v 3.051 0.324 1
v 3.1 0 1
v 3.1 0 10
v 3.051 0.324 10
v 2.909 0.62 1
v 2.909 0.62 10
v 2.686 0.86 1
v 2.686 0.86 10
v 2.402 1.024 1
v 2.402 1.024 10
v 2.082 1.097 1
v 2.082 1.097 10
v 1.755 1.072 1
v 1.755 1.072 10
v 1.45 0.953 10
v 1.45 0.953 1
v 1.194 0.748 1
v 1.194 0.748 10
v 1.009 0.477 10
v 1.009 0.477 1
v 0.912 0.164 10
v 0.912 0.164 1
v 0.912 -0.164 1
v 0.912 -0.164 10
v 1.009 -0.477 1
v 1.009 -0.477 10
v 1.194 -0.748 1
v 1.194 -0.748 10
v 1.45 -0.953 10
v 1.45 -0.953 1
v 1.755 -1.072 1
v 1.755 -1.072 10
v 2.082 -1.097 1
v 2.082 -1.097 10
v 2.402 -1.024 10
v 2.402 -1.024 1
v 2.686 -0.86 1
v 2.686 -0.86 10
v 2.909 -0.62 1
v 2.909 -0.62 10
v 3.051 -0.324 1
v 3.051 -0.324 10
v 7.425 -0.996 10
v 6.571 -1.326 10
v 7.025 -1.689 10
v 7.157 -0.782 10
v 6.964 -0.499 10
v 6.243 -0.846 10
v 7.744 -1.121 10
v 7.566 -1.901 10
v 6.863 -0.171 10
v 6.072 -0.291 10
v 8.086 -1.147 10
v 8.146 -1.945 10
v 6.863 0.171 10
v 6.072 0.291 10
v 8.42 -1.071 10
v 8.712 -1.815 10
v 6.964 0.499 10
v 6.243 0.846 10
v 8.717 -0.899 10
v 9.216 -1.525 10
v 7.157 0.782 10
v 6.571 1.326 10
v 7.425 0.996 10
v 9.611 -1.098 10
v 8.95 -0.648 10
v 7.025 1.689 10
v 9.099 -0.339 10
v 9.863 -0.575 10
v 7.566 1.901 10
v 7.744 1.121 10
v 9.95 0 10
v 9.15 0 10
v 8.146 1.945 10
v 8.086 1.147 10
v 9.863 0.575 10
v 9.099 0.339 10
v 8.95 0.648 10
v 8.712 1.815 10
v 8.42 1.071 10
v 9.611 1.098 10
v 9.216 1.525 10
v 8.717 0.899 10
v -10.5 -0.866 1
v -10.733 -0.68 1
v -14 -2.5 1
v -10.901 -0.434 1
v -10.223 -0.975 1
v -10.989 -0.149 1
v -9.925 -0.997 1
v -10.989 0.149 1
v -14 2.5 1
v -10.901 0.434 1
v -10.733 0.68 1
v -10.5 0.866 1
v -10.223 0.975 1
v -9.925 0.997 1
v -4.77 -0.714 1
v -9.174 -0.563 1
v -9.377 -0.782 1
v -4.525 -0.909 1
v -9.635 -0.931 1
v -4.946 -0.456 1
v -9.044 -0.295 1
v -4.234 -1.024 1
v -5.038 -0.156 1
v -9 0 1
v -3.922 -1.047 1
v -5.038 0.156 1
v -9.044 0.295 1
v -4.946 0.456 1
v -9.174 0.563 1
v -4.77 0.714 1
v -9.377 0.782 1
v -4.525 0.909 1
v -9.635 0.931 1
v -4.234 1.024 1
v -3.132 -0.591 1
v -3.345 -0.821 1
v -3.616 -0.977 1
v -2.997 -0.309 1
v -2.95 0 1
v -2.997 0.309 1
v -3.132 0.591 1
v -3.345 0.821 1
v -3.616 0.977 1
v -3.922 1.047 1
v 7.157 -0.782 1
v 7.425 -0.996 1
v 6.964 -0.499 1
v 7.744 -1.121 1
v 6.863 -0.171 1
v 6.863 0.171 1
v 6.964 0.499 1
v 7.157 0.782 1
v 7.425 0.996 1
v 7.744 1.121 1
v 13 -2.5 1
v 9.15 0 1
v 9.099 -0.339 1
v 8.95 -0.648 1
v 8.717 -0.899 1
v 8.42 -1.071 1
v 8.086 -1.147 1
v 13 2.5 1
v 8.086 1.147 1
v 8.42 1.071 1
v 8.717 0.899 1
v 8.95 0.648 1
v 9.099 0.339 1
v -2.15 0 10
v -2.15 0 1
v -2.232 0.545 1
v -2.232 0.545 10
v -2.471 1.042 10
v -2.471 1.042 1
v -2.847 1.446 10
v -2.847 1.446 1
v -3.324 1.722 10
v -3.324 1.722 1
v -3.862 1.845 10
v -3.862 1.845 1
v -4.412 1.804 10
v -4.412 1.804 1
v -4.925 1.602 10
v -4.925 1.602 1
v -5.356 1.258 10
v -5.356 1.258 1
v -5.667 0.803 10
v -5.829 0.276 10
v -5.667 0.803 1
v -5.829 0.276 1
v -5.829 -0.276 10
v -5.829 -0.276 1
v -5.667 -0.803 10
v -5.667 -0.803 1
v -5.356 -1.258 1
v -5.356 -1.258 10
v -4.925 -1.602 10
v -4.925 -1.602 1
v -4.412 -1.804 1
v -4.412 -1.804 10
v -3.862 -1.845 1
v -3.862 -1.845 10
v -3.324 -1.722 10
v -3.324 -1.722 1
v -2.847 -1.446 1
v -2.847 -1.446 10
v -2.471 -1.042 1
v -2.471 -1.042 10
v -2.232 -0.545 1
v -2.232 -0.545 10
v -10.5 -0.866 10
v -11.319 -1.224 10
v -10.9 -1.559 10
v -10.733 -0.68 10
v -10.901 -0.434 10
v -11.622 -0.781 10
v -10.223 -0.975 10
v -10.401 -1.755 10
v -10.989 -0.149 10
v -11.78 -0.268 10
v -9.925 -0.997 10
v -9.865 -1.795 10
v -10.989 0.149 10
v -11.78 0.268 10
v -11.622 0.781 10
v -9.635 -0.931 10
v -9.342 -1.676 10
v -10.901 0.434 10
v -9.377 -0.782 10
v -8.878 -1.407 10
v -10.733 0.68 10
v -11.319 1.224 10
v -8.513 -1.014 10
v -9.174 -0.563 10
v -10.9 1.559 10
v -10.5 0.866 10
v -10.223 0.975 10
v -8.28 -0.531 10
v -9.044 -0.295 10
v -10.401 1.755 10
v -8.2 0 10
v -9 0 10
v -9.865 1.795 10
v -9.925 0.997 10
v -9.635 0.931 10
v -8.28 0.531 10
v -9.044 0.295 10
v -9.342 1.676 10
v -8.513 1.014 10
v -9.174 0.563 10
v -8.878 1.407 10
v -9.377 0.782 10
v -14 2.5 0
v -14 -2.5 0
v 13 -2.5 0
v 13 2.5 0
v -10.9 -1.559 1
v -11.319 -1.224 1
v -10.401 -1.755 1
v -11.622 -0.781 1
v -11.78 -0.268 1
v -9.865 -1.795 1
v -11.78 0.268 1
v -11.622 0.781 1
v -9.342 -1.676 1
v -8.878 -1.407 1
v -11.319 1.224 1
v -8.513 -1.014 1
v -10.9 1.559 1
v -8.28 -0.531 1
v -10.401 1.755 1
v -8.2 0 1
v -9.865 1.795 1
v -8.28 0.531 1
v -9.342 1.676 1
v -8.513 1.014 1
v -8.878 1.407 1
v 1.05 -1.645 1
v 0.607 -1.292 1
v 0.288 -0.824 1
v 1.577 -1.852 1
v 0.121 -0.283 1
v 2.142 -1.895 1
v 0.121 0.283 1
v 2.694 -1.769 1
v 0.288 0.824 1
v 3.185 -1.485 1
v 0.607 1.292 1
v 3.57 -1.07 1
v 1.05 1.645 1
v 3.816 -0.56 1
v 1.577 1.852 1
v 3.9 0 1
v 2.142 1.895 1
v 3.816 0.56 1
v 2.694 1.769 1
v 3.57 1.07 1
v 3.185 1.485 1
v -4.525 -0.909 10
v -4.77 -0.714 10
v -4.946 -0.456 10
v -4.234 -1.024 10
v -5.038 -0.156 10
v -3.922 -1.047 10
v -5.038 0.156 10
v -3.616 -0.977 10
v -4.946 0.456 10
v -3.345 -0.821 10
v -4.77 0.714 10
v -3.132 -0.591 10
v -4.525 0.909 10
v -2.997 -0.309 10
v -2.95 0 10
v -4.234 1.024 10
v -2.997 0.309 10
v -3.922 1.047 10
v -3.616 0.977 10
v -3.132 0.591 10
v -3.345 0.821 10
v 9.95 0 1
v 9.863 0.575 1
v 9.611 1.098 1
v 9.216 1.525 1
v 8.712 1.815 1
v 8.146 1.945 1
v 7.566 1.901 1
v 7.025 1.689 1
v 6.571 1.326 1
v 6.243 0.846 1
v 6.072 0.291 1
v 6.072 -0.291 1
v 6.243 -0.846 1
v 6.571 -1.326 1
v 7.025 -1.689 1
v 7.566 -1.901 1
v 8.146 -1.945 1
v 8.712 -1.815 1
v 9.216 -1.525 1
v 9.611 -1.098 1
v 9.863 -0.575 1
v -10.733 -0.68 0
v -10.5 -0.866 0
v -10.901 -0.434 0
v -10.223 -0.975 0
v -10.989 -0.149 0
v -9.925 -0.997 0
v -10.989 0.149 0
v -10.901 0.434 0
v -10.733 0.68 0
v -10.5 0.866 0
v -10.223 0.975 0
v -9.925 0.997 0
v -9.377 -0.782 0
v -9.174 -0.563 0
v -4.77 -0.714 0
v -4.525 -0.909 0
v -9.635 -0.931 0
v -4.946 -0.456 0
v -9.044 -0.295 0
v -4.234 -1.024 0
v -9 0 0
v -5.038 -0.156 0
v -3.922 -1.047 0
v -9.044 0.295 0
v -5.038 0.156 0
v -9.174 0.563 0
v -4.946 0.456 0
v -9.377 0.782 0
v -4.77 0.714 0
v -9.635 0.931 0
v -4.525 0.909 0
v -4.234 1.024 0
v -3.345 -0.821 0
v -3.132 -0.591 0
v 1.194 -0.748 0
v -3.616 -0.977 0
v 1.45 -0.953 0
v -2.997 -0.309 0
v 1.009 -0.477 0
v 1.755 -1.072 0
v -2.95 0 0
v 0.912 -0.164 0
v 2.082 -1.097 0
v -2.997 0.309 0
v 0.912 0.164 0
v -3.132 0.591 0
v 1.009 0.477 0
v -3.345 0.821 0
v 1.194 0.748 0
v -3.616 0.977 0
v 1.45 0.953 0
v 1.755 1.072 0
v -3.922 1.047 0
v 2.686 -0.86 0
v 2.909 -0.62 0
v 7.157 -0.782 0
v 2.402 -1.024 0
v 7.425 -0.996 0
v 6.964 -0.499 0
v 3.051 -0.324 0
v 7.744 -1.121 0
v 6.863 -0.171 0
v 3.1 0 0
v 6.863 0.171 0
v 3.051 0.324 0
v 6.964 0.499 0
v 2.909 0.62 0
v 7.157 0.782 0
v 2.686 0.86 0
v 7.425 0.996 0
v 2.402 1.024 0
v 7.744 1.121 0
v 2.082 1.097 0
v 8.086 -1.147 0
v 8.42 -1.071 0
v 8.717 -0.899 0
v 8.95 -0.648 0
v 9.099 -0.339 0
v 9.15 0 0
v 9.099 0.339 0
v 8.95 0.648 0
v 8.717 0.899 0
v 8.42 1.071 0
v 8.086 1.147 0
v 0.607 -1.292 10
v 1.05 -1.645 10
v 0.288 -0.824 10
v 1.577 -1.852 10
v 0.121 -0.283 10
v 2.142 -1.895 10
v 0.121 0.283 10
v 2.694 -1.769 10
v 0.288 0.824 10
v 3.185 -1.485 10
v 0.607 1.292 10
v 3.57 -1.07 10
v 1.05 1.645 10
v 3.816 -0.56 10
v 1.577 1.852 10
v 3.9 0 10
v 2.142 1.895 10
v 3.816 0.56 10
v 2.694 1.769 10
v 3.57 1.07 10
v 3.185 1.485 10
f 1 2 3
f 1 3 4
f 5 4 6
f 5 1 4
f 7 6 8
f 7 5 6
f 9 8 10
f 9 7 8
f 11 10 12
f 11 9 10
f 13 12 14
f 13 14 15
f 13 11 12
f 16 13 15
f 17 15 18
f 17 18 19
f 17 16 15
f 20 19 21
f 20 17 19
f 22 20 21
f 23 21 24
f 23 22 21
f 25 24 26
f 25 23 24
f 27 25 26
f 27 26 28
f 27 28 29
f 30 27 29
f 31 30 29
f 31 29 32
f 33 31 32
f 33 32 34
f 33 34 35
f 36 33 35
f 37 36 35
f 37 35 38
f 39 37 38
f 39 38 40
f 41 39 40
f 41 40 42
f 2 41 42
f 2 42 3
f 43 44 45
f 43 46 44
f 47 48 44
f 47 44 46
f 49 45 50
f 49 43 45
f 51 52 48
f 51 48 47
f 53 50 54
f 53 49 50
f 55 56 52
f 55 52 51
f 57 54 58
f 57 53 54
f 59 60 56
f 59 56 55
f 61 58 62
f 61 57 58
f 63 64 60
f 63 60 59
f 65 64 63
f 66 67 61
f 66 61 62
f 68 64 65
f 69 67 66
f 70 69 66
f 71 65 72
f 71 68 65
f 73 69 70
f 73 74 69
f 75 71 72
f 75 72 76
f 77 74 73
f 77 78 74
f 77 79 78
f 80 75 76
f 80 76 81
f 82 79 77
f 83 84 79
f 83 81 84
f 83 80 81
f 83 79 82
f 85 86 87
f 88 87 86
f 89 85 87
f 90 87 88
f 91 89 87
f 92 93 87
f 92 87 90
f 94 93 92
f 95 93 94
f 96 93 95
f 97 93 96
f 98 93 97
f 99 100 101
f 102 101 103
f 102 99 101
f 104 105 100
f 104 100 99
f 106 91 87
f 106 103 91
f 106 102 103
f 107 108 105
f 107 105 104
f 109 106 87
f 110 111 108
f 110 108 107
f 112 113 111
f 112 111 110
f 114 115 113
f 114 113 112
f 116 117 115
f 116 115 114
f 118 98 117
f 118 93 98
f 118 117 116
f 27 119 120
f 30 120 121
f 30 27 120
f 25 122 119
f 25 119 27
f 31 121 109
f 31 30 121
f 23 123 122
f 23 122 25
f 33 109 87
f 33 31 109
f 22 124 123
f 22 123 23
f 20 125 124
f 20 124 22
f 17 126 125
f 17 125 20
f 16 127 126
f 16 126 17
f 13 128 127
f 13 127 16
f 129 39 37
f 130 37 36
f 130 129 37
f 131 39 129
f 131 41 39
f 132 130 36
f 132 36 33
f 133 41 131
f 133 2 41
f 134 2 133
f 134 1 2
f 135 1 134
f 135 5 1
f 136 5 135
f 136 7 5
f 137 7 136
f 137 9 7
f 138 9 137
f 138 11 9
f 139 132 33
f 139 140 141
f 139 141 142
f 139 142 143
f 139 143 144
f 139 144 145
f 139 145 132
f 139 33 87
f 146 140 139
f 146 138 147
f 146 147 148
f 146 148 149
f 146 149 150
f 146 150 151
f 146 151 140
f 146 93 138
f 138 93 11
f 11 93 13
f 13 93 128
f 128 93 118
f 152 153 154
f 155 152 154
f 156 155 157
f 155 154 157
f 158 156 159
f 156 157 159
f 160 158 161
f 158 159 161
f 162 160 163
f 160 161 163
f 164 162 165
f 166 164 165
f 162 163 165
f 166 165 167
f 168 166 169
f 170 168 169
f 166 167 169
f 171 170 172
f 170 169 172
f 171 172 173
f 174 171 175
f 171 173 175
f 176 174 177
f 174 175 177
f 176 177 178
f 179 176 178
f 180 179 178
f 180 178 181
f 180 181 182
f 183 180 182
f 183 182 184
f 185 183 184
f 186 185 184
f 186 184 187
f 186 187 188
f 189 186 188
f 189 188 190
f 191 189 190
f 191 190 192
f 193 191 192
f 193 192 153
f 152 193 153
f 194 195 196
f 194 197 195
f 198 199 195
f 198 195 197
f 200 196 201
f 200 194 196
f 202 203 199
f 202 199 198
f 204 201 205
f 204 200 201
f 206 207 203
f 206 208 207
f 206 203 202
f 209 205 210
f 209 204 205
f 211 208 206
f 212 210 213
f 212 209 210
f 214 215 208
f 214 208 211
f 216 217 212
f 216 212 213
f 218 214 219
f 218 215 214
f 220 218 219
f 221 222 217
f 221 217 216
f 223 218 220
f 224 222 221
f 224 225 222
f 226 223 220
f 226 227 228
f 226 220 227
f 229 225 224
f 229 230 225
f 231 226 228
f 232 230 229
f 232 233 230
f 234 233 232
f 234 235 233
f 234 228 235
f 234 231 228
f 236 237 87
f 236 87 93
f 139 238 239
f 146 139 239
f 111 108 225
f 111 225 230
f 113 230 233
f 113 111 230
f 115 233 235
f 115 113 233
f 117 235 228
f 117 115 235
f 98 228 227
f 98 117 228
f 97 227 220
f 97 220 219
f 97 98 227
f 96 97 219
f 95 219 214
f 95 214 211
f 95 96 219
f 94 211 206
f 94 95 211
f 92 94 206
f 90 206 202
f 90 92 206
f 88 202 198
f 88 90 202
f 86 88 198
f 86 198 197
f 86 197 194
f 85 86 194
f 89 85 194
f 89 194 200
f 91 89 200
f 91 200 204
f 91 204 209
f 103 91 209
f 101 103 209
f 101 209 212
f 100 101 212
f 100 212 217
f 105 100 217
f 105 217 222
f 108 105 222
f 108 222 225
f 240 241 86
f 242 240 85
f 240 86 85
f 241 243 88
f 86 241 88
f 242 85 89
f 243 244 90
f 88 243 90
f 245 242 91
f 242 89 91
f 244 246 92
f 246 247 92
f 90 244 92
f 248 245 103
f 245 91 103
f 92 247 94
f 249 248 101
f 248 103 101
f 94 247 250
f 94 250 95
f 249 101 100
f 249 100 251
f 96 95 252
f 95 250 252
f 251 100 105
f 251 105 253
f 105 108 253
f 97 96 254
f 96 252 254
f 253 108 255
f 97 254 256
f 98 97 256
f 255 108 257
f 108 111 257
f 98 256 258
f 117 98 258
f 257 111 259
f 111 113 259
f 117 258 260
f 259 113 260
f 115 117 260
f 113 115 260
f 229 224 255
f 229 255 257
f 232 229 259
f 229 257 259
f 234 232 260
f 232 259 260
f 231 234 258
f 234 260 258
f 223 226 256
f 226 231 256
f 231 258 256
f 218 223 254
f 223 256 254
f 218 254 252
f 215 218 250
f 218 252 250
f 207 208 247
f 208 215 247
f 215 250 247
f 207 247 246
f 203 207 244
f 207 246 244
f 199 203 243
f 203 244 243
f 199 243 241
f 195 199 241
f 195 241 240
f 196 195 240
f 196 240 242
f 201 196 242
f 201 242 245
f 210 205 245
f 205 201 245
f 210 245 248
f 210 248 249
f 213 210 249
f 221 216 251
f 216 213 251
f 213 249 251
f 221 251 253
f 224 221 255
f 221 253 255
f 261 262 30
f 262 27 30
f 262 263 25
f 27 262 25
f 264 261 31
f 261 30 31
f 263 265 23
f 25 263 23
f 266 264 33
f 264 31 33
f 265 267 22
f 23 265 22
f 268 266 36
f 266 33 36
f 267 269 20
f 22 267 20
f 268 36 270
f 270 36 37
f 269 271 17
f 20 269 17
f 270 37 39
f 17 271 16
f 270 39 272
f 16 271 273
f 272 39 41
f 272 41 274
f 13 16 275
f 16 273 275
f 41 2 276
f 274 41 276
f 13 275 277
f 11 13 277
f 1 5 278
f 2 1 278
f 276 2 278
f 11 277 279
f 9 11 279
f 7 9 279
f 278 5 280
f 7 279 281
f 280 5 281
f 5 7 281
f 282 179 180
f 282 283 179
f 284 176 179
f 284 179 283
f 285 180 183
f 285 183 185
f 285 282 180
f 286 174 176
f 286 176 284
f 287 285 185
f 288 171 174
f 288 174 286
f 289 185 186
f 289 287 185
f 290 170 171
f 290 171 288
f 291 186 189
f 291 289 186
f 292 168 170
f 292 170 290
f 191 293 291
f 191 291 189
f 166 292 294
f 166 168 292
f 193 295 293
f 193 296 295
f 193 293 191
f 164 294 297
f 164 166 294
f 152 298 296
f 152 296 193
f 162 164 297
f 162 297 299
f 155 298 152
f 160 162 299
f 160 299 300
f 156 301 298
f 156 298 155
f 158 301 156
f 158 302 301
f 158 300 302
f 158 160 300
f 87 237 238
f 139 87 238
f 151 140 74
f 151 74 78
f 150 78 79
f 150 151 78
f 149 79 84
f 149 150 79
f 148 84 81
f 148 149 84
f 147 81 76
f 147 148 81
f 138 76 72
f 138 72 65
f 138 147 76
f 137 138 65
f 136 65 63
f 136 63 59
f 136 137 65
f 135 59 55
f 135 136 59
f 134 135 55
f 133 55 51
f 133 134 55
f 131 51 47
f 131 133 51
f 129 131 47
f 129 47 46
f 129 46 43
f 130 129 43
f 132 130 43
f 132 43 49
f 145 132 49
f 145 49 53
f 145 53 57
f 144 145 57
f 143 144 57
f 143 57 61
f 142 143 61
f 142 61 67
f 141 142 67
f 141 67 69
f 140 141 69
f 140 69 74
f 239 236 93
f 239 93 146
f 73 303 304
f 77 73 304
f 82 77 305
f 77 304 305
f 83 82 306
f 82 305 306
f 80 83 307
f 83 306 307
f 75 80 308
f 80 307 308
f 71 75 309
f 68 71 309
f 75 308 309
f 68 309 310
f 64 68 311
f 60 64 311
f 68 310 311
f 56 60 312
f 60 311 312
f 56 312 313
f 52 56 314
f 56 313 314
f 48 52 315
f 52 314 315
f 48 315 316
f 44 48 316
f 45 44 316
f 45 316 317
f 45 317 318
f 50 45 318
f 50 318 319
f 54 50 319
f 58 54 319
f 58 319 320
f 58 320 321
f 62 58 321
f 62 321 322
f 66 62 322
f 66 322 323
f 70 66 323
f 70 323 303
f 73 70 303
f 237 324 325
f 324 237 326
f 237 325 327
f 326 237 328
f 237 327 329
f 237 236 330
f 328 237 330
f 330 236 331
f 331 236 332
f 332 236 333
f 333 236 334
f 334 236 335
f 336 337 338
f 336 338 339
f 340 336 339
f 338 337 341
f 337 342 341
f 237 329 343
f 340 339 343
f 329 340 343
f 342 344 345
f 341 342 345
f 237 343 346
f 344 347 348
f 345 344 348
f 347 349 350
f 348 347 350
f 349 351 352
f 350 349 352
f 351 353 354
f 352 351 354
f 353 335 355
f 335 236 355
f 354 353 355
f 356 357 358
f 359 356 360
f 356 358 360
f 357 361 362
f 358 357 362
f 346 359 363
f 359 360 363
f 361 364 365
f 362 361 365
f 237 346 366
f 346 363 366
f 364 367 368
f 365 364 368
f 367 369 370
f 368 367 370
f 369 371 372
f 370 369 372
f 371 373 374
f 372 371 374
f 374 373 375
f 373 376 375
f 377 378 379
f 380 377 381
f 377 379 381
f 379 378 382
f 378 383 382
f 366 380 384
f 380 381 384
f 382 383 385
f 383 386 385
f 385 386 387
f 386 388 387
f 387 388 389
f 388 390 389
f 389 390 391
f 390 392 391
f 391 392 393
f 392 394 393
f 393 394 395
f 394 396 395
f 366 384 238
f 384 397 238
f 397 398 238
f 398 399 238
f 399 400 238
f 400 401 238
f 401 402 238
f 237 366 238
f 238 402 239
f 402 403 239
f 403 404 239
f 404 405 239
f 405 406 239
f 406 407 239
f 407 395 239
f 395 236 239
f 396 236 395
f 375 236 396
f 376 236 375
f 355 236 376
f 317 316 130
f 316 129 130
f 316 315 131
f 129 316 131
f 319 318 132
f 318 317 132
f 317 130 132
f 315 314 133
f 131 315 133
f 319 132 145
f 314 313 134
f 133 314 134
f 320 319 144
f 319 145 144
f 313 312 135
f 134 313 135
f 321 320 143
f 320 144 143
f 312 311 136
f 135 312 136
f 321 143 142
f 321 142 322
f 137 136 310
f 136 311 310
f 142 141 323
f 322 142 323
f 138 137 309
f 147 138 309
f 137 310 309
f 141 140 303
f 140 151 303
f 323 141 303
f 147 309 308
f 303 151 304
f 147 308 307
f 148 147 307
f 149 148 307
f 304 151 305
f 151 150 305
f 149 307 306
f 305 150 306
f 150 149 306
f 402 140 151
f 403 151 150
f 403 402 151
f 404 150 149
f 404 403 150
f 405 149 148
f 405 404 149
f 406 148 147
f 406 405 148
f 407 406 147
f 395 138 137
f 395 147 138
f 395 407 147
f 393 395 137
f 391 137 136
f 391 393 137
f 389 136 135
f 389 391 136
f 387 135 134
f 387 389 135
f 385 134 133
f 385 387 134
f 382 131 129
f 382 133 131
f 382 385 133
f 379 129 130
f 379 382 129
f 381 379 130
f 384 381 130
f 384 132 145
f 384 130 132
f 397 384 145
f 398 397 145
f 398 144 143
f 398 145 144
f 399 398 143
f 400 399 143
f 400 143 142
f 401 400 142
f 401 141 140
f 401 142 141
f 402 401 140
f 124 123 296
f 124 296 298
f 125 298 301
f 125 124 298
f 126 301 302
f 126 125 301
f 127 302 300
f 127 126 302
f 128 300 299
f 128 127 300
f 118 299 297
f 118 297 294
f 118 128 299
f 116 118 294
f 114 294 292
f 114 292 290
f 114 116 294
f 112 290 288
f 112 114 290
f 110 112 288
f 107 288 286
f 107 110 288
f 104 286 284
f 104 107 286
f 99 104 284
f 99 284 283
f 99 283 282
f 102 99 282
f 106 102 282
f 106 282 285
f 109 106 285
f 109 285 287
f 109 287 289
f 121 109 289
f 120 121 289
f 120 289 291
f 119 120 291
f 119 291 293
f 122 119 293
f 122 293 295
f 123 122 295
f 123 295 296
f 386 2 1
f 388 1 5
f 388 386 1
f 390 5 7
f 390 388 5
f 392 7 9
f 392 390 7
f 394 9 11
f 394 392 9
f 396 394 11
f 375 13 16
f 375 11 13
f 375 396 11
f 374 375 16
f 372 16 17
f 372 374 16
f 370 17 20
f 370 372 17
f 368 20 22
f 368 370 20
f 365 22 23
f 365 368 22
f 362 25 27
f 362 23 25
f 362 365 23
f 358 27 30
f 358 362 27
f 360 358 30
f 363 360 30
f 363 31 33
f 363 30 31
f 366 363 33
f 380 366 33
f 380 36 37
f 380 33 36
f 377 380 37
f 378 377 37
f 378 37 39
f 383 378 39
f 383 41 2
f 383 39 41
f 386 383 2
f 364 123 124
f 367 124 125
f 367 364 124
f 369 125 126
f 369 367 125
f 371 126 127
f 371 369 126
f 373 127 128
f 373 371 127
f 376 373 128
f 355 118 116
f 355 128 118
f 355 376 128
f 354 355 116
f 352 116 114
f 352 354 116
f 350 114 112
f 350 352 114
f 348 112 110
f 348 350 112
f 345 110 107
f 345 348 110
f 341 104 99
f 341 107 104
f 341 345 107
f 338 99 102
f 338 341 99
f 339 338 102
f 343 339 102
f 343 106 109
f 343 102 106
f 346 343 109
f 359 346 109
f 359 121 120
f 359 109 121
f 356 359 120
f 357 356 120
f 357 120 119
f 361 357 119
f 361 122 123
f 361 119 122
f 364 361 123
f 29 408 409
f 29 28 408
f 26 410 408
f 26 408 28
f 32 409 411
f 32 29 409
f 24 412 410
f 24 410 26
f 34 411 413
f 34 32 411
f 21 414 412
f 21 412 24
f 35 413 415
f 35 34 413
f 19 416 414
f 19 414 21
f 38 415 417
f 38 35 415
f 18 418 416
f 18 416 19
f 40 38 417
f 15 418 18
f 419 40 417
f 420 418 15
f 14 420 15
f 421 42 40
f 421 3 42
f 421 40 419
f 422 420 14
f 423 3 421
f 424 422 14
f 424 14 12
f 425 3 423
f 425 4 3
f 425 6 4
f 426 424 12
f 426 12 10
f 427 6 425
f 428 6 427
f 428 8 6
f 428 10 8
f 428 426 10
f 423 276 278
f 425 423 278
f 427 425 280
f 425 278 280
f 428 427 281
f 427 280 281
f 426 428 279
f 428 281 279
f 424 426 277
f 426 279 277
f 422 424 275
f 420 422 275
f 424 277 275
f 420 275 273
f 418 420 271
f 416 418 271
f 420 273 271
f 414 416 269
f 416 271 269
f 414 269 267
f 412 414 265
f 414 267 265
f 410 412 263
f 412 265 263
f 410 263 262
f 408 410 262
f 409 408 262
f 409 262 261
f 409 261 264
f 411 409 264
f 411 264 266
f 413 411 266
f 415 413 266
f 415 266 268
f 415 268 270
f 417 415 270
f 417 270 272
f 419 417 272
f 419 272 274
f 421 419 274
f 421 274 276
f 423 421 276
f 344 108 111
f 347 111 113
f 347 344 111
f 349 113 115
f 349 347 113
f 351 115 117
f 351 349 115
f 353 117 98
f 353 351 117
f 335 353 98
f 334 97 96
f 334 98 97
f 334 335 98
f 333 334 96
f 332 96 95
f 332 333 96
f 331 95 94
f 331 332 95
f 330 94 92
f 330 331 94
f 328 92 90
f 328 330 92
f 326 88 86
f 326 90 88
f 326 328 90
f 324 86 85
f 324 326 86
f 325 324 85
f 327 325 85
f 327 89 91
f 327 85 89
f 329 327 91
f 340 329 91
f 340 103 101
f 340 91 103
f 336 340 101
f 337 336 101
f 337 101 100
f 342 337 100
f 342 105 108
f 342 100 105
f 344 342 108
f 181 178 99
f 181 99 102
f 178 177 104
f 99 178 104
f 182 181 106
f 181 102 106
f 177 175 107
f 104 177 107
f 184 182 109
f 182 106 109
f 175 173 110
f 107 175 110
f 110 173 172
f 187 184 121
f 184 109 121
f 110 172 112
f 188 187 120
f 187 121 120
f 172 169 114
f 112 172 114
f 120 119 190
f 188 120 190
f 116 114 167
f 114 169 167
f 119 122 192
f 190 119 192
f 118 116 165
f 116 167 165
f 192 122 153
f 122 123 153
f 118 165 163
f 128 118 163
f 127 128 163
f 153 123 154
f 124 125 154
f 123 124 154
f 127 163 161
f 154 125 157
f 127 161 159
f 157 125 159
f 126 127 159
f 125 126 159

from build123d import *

# Parameters (mm, degrees)
BOX_W          = 30
BOX_H          = 5
BOX_DEPTH      = 2
CIRCLE_R       = 1
PAD_DEPTH      = 10
THICKNESS_T    = 0.8
BOX001_W       = 30
BOX001_H       = 5
BOX001_DEPTH   = 2
CIRCLE001_R    = 1.05
PAD001_DEPTH   = 10
THICKNESS001_T = 0.8
BOX002_W       = 30
BOX002_H       = 5
BOX002_DEPTH   = 2
CIRCLE002_R    = 1.1
PAD002_DEPTH   = 10
THICKNESS002_T = 0.8
BOX003_W       = 30
BOX003_H       = 5
BOX003_DEPTH   = 2
CIRCLE003_R    = 1.15
PAD003_DEPTH   = 10
THICKNESS003_T = 0.8
CIRCLE007_R    = 1.1
PAD007_DEPTH   = 10
CIRCLE006_R    = 1.15
PAD006_DEPTH   = 10
CIRCLE005_R    = 1.05
PAD005_DEPTH   = 10
CIRCLE004_R    = 1
PAD004_DEPTH   = 10
BOX004_W       = 27
BOX004_H       = 5
BOX004_DEPTH   = 1


with BuildPart() as cube:
    # Box → Box (new body)
    with BuildSketch(Plane(origin=(-15, -3, -1), x_dir=(1, 0, 0), z_dir=(0, 0, 1))):
        with Locations((15, 2.5)):
            Rectangle(BOX_W, BOX_H)
    extrude(amount=BOX_DEPTH)


with BuildPart() as cut:
    # Circle → Pad (new body)
    with BuildSketch(Plane(origin=(-10, 0, 0), x_dir=(1, 0, 0), z_dir=(0, 0, 1))):
        Circle(CIRCLE_R)
    extrude(amount=PAD_DEPTH)

    # Thickness
    thickness_openings = [cut.faces().sort_by_distance(p)[0] for p in [
        (-10, 0, 10),
    ]]
    offset(amount=THICKNESS_T, openings=thickness_openings, kind=Kind.INTERSECTION)

    # Cut: cut Cube
    add(cube.part, mode=Mode.SUBTRACT)


with BuildPart() as cube001:
    # Box001 → Box001 (new body)
    with BuildSketch(Plane(origin=(-15, -3, -1), x_dir=(1, 0, 0), z_dir=(0, 0, 1))):
        with Locations((15, 2.5)):
            Rectangle(BOX001_W, BOX001_H)
    extrude(amount=BOX001_DEPTH)


with BuildPart() as cut001:
    # Circle001 → Pad001 (new body)
    with BuildSketch(Plane(origin=(-4, 0, 0), x_dir=(1, 0, 0), z_dir=(0, 0, 1))):
        Circle(CIRCLE001_R)
    extrude(amount=PAD001_DEPTH)

    # Thickness001
    thickness001_openings = [cut001.faces().sort_by_distance(p)[0] for p in [
        (-4, 0, 10),
    ]]
    offset(amount=THICKNESS001_T, openings=thickness001_openings)

    # Cut001: cut Cube001
    add(cube001.part, mode=Mode.SUBTRACT)


with BuildPart() as cube002:
    # Box002 → Box002 (new body)
    with BuildSketch(Plane(origin=(-15, -3, -1), x_dir=(1, 0, 0), z_dir=(0, 0, 1))):
        with Locations((15, 2.5)):
            Rectangle(BOX002_W, BOX002_H)
    extrude(amount=BOX002_DEPTH)


with BuildPart() as cut002:
    # Circle002 → Pad002 (new body)
    with BuildSketch(Plane(origin=(2, 0, 0), x_dir=(1, 0, 0), z_dir=(0, 0, 1))):
        Circle(CIRCLE002_R)
    extrude(amount=PAD002_DEPTH)

    # Thickness002
    thickness002_openings = [cut002.faces().sort_by_distance(p)[0] for p in [
        (2, 0, 10),
    ]]
    offset(amount=THICKNESS002_T, openings=thickness002_openings)

    # Cut002: cut Cube002
    add(cube002.part, mode=Mode.SUBTRACT)


with BuildPart() as cube003:
    # Box003 → Box003 (new body)
    with BuildSketch(Plane(origin=(-15, -3, -1), x_dir=(1, 0, 0), z_dir=(0, 0, 1))):
        with Locations((15, 2.5)):
            Rectangle(BOX003_W, BOX003_H)
    extrude(amount=BOX003_DEPTH)


with BuildPart() as cut003:
    # Circle003 → Pad003 (new body)
    with BuildSketch(Plane(origin=(8, 0, 0), x_dir=(1, 0, 0), z_dir=(0, 0, 1))):
        Circle(CIRCLE003_R)
    extrude(amount=PAD003_DEPTH)

    # Thickness003
    thickness003_openings = [cut003.faces().sort_by_distance(p)[0] for p in [
        (8, 0, 10),
    ]]
    offset(amount=THICKNESS003_T, openings=thickness003_openings)

    # Cut003: cut Cube003
    add(cube003.part, mode=Mode.SUBTRACT)


with BuildPart() as pad007:
    # Circle007 → Pad007 (new body)
    with BuildSketch(Plane(origin=(2, 0, 0), x_dir=(1, 0, 0), z_dir=(0, 0, 1))):
        Circle(CIRCLE007_R)
    extrude(amount=PAD007_DEPTH)


with BuildPart() as pad006:
    # Circle006 → Pad006 (new body)
    with BuildSketch(Plane(origin=(8, 0, 0), x_dir=(1, 0, 0), z_dir=(0, 0, 1))):
        Circle(CIRCLE006_R)
    extrude(amount=PAD006_DEPTH)


with BuildPart() as pad005:
    # Circle005 → Pad005 (new body)
    with BuildSketch(Plane(origin=(-4, 0, 0), x_dir=(1, 0, 0), z_dir=(0, 0, 1))):
        Circle(CIRCLE005_R)
    extrude(amount=PAD005_DEPTH)


with BuildPart() as pad004:
    # Circle004 → Pad004 (new body)
    with BuildSketch(Plane(origin=(-10, 0, 0), x_dir=(1, 0, 0), z_dir=(0, 0, 1))):
        Circle(CIRCLE004_R)
    extrude(amount=PAD004_DEPTH)


with BuildPart() as cut007:
    # Box004 → Box004 (new body)
    with BuildSketch(Plane(origin=(-14, -2.5, 0), x_dir=(1, 0, 0), z_dir=(0, 0, 1))):
        with Locations((13.5, 2.5)):
            Rectangle(BOX004_W, BOX004_H)
    extrude(amount=BOX004_DEPTH)

    # Cut004: cut Pad004
    add(pad004.part, mode=Mode.SUBTRACT)

    # Cut005: cut Pad005
    add(pad005.part, mode=Mode.SUBTRACT)

    # Cut006: cut Pad006
    add(pad006.part, mode=Mode.SUBTRACT)

    # Cut007: cut Pad007
    add(pad007.part, mode=Mode.SUBTRACT)


solid = Compound([cut.part, cut001.part, cut002.part, cut003.part, cut007.part])
